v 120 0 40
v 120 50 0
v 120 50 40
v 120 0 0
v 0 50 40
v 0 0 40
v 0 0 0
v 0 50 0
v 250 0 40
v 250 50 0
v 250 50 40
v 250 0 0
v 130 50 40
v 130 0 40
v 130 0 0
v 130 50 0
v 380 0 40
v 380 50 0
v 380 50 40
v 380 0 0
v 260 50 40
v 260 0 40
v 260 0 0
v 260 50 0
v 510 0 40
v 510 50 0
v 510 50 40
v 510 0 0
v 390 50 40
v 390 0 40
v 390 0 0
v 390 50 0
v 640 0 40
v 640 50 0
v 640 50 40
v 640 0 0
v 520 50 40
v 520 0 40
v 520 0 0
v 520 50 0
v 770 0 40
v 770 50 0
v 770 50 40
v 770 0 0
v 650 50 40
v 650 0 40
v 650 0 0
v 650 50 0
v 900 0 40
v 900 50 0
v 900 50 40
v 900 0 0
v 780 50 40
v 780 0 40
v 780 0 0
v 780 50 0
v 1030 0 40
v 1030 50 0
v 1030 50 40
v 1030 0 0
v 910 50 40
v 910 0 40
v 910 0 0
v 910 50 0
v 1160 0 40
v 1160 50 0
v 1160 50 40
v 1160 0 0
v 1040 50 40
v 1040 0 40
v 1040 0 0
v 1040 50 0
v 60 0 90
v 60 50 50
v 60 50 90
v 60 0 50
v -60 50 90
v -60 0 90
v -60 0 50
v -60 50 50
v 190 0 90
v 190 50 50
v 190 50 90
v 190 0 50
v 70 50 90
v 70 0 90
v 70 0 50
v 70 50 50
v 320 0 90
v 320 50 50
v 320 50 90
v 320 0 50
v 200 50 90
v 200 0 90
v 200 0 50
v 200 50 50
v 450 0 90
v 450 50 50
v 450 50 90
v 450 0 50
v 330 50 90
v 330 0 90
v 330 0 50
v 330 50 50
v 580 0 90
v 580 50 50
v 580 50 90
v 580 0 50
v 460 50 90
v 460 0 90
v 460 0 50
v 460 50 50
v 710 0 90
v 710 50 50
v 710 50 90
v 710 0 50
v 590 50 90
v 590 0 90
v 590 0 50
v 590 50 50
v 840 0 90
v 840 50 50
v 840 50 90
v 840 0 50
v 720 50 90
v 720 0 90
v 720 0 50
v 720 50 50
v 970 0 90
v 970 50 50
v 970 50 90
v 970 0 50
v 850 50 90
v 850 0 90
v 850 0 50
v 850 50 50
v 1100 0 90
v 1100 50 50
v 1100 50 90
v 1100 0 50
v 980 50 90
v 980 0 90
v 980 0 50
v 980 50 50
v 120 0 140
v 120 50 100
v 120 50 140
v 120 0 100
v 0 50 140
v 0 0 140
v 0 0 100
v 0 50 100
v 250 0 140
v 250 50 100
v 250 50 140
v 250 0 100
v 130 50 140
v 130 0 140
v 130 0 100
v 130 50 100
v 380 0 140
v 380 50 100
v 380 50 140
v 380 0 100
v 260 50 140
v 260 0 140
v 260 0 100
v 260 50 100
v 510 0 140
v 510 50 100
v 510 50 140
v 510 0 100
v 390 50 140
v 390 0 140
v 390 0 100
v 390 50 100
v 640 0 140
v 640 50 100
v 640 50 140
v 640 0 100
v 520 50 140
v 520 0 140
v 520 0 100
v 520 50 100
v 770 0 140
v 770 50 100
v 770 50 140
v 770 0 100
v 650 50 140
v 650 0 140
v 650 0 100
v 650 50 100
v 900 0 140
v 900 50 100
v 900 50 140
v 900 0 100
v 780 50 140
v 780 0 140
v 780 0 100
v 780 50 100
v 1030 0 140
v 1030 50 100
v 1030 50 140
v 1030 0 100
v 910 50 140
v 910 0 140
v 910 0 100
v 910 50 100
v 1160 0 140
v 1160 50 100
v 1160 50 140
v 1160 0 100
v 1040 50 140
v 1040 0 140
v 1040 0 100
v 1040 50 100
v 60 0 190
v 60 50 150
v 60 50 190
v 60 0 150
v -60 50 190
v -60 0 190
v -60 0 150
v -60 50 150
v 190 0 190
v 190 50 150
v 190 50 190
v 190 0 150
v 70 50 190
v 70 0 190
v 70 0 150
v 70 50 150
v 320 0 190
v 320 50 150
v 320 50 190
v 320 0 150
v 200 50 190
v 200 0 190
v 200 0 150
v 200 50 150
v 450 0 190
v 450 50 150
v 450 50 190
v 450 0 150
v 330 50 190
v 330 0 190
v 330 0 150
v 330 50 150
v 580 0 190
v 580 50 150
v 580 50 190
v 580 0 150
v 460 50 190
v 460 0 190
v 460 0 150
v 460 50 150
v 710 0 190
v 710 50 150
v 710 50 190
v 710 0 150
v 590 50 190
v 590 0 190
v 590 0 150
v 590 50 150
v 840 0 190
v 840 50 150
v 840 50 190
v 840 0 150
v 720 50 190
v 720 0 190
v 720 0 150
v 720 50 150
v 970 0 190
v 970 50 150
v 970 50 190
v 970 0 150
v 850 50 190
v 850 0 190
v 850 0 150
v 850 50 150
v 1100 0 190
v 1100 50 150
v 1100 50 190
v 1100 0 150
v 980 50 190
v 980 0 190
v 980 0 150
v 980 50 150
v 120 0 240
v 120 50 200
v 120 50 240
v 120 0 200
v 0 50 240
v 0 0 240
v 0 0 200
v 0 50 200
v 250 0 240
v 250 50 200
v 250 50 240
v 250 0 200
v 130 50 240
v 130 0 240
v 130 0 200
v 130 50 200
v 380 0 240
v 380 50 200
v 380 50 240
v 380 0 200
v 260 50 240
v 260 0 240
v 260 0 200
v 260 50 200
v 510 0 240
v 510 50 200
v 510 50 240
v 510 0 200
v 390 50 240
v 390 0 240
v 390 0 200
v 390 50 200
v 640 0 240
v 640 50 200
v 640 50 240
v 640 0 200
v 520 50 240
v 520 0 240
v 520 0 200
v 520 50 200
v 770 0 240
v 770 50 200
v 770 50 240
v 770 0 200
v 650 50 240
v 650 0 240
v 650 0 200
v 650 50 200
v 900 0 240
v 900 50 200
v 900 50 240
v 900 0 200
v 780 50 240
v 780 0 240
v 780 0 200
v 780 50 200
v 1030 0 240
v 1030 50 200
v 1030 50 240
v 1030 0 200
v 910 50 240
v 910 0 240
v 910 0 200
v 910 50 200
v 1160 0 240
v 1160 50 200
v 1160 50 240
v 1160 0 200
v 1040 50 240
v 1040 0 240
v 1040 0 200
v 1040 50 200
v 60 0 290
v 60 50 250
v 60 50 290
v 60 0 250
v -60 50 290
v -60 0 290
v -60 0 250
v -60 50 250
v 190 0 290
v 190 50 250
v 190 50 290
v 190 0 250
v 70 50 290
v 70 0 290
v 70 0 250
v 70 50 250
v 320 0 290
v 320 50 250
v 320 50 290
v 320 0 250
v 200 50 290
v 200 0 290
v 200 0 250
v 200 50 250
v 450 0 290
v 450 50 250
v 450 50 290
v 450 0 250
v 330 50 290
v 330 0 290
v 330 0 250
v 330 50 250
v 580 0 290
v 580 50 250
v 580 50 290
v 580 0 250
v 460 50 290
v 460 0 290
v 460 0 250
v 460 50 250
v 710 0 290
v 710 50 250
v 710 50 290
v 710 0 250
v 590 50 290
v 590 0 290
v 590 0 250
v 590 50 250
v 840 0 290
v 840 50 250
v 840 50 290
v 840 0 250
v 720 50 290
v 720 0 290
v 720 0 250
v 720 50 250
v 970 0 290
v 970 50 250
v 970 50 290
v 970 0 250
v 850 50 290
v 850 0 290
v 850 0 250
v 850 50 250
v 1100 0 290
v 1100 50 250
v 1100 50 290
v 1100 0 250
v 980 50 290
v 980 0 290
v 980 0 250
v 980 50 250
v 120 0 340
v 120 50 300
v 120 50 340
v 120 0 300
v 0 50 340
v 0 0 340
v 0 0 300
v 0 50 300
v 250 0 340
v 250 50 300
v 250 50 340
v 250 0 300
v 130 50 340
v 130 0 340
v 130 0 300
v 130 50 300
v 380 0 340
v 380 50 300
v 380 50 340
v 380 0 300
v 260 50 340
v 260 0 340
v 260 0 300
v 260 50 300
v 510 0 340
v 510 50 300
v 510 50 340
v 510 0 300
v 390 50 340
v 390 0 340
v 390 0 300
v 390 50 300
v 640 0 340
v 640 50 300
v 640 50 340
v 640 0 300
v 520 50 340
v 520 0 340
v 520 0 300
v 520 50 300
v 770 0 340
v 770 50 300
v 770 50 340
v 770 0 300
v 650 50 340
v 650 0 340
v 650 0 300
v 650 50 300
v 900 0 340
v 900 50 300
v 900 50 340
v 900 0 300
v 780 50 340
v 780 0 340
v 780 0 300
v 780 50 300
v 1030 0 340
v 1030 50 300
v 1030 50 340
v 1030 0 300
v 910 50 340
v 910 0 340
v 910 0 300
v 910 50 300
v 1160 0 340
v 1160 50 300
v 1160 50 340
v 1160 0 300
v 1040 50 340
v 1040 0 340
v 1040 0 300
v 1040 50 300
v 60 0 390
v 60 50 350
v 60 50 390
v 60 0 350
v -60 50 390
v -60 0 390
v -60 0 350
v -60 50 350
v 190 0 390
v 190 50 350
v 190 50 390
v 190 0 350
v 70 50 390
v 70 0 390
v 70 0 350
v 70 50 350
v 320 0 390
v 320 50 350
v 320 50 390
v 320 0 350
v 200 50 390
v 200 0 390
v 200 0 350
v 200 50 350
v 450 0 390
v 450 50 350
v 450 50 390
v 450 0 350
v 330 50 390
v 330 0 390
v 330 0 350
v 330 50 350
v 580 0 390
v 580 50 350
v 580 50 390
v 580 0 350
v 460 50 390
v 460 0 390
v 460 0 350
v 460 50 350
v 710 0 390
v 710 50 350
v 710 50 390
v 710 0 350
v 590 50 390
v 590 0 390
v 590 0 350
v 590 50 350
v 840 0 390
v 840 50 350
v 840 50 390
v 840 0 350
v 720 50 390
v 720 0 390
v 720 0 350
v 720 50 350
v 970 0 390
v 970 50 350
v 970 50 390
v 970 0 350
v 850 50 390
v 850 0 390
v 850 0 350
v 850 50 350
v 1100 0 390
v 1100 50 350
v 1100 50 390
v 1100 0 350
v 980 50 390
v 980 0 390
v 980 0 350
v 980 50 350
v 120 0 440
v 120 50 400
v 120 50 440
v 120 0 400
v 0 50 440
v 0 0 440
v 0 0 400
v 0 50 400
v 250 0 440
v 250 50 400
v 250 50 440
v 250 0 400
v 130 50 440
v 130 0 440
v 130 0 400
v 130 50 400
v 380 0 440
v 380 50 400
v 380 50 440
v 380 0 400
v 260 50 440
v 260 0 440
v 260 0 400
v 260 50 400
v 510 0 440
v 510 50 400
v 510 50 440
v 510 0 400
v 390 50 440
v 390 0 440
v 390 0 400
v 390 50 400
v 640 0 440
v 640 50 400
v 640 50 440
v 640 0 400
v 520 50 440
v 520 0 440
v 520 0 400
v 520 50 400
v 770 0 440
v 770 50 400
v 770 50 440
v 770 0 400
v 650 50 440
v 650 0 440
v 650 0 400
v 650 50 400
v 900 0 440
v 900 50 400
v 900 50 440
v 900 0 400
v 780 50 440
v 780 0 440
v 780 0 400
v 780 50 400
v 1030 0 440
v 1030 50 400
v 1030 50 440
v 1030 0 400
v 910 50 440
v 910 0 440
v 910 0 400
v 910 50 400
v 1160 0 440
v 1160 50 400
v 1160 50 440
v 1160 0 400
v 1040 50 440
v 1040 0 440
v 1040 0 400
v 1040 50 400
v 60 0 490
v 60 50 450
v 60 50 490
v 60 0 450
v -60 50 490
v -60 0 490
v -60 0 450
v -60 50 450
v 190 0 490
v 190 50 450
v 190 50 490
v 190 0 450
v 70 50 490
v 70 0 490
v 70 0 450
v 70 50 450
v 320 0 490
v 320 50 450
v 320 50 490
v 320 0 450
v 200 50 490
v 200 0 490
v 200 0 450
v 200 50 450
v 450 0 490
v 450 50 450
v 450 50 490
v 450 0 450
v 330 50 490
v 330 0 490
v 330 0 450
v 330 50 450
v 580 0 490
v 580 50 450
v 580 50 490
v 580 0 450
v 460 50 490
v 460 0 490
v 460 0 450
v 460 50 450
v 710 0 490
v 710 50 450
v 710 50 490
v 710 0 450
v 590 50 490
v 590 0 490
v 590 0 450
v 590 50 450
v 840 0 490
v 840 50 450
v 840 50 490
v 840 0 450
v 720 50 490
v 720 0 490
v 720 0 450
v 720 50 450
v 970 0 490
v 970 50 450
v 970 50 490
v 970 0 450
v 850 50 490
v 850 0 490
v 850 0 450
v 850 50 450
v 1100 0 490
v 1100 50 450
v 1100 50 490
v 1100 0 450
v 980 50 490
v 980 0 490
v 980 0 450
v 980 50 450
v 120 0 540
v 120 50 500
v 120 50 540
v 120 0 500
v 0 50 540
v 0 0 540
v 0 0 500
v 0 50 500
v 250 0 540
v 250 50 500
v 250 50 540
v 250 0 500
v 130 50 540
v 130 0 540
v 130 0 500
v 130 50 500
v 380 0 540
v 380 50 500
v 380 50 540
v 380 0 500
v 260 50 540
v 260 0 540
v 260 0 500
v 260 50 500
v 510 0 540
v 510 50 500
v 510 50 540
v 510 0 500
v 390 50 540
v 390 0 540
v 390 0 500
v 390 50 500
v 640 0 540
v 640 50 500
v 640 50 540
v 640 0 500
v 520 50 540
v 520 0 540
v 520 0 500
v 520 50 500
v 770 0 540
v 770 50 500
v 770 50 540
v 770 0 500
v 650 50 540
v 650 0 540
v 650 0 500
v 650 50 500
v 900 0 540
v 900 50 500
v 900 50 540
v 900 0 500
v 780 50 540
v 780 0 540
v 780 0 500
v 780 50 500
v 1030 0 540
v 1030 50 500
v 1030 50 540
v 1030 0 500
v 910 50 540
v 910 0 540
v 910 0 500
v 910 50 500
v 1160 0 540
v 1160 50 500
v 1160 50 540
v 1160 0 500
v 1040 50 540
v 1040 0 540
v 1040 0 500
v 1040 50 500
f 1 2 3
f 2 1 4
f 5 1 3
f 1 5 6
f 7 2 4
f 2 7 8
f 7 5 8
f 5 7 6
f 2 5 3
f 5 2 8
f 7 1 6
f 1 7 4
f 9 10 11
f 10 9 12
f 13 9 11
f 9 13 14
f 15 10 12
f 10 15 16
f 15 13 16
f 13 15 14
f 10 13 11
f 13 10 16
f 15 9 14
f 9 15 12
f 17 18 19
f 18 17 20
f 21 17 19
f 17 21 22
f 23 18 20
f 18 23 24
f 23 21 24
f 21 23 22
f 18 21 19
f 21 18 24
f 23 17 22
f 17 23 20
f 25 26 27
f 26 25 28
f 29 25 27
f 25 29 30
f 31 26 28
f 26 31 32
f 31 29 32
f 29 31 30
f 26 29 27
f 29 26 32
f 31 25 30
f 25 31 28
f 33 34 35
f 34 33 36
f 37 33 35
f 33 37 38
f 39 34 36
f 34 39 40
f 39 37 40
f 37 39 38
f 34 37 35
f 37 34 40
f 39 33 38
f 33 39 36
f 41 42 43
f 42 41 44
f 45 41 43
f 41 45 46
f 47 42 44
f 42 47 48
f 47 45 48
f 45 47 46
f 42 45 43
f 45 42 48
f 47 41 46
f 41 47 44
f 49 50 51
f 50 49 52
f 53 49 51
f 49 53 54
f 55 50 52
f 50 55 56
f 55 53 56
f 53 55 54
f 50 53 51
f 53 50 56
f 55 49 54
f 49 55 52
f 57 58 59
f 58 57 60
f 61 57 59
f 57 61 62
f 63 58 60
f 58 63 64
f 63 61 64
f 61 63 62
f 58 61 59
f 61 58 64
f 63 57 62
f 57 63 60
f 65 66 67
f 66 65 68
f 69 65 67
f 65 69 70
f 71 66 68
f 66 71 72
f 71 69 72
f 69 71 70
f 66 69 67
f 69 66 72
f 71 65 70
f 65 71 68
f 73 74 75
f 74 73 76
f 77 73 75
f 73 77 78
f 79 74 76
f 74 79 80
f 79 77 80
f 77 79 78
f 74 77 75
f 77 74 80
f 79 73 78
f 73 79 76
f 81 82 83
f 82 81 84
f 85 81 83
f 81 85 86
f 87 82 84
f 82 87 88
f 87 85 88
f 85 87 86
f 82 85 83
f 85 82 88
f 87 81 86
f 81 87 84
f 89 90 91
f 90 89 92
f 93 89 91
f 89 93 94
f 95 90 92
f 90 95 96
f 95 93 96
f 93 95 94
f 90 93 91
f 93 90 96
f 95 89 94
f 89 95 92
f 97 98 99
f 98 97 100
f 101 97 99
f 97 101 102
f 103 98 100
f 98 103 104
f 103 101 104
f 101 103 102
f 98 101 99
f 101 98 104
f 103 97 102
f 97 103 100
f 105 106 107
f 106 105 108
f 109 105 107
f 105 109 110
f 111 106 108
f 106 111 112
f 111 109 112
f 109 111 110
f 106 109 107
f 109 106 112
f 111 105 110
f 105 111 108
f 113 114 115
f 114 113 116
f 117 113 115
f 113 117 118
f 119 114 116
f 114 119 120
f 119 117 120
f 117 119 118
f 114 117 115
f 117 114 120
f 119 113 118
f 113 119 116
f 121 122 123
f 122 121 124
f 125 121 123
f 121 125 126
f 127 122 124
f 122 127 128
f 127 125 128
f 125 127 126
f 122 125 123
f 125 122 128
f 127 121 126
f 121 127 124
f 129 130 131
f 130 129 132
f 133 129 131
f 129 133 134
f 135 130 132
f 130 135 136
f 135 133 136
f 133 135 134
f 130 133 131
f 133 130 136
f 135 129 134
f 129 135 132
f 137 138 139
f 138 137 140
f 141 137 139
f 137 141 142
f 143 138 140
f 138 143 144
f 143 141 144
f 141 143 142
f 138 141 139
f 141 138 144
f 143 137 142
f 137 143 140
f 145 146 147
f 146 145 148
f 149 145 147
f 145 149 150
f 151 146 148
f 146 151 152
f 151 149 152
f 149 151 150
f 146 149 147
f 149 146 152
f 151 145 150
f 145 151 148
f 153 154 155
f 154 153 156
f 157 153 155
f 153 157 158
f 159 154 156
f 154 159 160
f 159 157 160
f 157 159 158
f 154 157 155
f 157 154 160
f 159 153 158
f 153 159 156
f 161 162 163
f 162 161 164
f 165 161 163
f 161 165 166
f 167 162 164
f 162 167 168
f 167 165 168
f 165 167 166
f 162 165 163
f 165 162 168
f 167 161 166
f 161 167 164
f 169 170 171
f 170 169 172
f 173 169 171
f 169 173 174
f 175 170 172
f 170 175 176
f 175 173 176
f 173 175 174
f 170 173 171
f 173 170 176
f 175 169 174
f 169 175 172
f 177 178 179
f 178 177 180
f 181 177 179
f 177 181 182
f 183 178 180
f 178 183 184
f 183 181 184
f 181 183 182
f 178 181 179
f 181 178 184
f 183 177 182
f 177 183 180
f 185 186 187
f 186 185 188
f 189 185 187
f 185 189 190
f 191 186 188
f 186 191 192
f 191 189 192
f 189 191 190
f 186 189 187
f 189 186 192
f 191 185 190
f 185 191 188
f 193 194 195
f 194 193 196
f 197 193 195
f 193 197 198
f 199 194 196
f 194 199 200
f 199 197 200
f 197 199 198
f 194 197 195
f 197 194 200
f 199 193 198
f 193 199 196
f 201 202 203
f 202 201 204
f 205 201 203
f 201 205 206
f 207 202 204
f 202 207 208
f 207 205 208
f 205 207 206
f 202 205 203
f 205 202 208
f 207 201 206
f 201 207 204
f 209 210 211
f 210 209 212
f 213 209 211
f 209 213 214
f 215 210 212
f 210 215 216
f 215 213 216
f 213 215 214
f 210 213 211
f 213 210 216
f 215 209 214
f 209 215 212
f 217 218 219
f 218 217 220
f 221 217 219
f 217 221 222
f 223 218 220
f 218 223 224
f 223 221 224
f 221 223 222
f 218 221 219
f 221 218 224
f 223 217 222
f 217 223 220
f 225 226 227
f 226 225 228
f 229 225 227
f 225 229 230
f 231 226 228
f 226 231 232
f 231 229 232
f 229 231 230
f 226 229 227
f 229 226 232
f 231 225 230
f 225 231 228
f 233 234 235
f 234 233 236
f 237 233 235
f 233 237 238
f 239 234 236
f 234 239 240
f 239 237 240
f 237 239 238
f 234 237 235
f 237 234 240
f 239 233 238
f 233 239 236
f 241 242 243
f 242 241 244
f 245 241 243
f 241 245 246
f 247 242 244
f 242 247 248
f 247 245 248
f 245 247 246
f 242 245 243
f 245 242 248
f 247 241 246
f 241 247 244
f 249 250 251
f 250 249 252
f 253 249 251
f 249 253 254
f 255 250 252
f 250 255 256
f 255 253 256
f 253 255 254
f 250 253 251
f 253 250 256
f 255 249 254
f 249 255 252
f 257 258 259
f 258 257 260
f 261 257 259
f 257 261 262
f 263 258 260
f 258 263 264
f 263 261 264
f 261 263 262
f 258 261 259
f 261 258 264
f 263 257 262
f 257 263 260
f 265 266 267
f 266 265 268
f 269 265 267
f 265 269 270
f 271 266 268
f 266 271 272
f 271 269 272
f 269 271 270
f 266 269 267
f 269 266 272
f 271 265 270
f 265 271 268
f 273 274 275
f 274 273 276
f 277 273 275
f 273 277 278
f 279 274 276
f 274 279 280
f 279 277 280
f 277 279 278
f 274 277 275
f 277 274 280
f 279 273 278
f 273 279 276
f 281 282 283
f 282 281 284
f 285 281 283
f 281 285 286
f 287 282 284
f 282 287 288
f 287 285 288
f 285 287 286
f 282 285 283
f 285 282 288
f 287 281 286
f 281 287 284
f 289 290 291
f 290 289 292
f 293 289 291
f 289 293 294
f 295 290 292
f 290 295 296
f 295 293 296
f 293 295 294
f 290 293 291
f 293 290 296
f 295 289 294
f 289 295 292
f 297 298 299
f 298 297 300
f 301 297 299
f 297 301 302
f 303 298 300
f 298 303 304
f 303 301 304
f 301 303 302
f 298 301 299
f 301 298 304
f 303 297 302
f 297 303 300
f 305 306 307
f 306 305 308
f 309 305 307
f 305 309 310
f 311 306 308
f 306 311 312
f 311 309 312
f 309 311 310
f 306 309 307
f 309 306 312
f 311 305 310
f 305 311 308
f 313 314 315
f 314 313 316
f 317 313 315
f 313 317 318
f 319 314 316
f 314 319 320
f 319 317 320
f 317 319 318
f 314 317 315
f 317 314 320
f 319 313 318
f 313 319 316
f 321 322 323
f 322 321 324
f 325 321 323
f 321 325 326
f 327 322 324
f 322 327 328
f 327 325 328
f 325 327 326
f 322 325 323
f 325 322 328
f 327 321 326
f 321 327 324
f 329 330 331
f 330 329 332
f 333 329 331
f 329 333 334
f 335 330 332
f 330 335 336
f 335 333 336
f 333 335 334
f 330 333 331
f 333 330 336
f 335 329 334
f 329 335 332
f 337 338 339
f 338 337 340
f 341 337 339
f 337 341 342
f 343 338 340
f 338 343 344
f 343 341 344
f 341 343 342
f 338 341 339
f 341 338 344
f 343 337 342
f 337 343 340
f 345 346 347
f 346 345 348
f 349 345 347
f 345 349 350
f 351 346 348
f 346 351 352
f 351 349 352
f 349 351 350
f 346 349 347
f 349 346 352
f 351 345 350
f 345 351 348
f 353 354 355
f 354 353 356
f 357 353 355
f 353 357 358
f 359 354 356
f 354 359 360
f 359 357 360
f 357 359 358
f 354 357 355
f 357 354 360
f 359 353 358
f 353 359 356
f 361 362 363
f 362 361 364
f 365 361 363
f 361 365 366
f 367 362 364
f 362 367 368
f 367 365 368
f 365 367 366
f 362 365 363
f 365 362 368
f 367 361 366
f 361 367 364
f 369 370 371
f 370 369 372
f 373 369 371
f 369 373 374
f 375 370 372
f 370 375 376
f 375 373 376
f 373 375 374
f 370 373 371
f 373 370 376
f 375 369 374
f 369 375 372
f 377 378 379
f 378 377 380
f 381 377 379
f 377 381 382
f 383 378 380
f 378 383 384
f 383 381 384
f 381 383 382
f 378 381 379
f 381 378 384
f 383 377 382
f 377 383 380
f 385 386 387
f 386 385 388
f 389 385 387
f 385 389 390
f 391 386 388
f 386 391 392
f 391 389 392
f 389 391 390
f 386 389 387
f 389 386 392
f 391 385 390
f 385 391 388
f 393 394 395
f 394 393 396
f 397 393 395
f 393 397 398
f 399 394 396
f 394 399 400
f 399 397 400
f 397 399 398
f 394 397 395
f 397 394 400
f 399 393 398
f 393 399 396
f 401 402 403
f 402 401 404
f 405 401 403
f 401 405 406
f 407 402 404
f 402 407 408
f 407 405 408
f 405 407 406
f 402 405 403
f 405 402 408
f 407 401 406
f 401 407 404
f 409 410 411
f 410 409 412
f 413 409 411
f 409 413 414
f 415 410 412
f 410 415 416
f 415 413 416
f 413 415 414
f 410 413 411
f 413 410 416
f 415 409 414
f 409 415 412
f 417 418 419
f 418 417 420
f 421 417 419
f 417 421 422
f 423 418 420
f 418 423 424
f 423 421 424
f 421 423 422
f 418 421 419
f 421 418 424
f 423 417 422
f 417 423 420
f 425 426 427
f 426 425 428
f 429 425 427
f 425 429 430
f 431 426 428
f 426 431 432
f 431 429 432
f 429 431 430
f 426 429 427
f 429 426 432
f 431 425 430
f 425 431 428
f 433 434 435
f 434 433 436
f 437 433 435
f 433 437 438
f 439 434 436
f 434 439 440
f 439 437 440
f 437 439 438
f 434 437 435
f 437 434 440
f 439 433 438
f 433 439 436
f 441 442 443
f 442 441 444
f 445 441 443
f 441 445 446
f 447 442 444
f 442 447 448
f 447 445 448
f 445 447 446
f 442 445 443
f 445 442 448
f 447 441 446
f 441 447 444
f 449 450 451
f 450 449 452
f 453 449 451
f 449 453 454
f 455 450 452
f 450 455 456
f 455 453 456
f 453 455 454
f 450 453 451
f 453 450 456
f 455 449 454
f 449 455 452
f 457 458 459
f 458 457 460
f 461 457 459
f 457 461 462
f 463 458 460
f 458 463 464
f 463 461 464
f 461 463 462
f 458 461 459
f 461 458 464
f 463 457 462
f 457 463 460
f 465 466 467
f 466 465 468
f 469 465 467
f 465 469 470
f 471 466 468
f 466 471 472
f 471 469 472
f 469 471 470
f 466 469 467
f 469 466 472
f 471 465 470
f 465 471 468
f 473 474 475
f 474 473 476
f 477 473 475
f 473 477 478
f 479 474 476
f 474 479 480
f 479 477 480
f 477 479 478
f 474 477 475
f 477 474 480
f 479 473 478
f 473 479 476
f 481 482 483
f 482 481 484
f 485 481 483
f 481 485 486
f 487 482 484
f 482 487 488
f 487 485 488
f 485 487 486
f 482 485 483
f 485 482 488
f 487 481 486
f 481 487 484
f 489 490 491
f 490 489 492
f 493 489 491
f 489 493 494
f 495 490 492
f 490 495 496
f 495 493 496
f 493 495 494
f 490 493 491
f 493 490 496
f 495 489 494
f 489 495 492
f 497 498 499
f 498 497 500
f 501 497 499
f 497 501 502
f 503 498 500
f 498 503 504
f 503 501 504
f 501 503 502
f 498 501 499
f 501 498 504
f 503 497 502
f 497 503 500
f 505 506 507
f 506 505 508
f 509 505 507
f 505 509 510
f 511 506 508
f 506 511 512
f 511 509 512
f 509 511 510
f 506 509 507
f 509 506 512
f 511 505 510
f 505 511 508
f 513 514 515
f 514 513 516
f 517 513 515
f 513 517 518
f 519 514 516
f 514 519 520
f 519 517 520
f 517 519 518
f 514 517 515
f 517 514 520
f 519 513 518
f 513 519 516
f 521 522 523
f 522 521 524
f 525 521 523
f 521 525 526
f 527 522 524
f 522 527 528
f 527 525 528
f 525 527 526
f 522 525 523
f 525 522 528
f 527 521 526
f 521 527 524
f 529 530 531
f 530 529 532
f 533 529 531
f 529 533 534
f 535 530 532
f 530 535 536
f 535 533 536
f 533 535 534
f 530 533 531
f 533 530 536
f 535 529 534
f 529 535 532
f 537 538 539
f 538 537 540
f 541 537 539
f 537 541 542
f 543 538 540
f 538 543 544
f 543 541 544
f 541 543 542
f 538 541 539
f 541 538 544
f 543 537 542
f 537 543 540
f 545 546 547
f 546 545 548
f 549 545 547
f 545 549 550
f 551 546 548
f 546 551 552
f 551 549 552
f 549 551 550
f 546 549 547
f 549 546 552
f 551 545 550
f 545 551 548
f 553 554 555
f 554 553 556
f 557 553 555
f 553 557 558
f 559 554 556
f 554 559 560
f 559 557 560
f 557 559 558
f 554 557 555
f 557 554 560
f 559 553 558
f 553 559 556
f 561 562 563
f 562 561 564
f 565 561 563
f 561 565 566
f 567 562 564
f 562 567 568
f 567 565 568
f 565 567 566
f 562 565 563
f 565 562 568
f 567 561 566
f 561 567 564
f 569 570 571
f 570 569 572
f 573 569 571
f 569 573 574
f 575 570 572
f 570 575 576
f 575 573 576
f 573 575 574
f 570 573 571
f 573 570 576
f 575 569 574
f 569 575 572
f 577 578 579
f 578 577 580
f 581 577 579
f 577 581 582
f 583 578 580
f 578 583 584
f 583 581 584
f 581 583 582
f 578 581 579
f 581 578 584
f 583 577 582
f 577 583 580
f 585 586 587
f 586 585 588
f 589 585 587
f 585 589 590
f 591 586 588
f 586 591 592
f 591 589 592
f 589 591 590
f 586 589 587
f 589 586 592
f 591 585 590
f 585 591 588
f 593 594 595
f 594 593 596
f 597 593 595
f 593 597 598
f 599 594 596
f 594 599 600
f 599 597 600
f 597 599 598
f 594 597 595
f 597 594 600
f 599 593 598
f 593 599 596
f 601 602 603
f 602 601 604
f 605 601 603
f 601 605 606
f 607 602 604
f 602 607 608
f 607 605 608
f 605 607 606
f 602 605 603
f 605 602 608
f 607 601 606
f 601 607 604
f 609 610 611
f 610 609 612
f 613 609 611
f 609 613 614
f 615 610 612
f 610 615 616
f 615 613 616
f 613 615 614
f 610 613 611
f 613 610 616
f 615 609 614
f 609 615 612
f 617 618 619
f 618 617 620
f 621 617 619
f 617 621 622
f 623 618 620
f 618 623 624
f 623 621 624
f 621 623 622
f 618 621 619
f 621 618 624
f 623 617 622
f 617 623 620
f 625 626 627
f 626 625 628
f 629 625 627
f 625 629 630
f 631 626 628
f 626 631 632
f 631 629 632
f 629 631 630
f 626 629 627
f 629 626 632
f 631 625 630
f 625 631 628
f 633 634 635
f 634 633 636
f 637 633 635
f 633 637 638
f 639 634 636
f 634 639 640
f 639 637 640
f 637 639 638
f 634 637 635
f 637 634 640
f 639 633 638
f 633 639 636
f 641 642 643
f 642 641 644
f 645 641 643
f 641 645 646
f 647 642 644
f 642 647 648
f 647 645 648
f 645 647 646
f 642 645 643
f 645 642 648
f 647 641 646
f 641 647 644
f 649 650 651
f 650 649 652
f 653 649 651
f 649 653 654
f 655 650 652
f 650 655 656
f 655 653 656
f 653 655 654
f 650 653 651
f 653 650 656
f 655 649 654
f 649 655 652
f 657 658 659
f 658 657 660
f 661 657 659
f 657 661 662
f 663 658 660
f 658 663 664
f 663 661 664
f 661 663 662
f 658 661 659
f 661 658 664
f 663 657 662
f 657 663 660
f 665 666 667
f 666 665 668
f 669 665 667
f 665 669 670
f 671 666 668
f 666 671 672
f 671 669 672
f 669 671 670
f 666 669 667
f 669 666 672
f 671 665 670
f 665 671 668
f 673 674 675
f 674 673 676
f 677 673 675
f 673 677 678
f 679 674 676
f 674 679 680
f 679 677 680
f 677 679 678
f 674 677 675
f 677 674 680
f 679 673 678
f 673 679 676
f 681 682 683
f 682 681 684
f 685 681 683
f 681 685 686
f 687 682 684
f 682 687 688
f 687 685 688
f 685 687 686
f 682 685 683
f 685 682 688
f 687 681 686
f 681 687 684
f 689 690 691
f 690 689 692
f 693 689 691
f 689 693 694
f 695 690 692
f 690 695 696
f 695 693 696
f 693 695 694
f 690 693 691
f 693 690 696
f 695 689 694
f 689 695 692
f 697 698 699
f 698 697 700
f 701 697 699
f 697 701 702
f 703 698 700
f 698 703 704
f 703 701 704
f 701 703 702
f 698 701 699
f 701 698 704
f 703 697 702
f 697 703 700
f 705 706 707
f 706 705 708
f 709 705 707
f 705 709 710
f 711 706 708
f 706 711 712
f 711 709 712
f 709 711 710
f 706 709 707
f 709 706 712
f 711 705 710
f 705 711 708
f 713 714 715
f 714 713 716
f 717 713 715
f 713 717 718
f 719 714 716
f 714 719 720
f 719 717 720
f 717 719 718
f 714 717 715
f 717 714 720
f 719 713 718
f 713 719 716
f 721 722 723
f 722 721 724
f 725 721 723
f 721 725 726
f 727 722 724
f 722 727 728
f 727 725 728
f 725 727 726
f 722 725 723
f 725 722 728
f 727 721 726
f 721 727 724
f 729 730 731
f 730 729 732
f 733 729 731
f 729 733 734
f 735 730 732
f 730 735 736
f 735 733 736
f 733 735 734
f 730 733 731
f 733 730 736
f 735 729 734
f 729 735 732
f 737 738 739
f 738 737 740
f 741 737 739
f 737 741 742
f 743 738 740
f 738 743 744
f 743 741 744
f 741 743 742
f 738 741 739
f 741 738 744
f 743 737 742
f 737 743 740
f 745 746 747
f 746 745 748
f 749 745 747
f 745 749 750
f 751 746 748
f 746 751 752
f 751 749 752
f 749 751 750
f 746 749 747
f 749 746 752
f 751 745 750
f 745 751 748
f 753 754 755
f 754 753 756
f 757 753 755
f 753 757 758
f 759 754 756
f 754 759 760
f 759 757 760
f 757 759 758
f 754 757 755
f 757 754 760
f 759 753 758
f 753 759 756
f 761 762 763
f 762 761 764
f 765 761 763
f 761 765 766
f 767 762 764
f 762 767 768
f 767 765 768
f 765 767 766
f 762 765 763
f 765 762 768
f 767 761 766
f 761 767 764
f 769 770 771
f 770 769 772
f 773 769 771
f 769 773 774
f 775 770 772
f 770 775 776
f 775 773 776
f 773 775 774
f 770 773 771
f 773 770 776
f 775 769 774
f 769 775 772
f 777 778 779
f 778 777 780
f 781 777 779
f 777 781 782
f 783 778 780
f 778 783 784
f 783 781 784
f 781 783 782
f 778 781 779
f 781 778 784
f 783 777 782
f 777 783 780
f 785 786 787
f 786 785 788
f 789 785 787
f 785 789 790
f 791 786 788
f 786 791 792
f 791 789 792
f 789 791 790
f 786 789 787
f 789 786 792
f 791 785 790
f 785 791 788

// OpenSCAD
b_height=40;
b_width=120;
b_length=50;
mortar=10;

for ( z = [0: 1: 10]){
    for ( x = [0: 1: 8]){
        if(z%2==0){
         translate ([x*(b_width+mortar),0,z*(b_height+mortar)]) 
            cube([b_width, b_length, b_height]); 
        }
        else{
         translate ([x*(b_width+mortar)-.5*b_width,0,z*(b_height+mortar)]) 
            cube([b_width, b_length, b_height]);
        }
    } 
} 
